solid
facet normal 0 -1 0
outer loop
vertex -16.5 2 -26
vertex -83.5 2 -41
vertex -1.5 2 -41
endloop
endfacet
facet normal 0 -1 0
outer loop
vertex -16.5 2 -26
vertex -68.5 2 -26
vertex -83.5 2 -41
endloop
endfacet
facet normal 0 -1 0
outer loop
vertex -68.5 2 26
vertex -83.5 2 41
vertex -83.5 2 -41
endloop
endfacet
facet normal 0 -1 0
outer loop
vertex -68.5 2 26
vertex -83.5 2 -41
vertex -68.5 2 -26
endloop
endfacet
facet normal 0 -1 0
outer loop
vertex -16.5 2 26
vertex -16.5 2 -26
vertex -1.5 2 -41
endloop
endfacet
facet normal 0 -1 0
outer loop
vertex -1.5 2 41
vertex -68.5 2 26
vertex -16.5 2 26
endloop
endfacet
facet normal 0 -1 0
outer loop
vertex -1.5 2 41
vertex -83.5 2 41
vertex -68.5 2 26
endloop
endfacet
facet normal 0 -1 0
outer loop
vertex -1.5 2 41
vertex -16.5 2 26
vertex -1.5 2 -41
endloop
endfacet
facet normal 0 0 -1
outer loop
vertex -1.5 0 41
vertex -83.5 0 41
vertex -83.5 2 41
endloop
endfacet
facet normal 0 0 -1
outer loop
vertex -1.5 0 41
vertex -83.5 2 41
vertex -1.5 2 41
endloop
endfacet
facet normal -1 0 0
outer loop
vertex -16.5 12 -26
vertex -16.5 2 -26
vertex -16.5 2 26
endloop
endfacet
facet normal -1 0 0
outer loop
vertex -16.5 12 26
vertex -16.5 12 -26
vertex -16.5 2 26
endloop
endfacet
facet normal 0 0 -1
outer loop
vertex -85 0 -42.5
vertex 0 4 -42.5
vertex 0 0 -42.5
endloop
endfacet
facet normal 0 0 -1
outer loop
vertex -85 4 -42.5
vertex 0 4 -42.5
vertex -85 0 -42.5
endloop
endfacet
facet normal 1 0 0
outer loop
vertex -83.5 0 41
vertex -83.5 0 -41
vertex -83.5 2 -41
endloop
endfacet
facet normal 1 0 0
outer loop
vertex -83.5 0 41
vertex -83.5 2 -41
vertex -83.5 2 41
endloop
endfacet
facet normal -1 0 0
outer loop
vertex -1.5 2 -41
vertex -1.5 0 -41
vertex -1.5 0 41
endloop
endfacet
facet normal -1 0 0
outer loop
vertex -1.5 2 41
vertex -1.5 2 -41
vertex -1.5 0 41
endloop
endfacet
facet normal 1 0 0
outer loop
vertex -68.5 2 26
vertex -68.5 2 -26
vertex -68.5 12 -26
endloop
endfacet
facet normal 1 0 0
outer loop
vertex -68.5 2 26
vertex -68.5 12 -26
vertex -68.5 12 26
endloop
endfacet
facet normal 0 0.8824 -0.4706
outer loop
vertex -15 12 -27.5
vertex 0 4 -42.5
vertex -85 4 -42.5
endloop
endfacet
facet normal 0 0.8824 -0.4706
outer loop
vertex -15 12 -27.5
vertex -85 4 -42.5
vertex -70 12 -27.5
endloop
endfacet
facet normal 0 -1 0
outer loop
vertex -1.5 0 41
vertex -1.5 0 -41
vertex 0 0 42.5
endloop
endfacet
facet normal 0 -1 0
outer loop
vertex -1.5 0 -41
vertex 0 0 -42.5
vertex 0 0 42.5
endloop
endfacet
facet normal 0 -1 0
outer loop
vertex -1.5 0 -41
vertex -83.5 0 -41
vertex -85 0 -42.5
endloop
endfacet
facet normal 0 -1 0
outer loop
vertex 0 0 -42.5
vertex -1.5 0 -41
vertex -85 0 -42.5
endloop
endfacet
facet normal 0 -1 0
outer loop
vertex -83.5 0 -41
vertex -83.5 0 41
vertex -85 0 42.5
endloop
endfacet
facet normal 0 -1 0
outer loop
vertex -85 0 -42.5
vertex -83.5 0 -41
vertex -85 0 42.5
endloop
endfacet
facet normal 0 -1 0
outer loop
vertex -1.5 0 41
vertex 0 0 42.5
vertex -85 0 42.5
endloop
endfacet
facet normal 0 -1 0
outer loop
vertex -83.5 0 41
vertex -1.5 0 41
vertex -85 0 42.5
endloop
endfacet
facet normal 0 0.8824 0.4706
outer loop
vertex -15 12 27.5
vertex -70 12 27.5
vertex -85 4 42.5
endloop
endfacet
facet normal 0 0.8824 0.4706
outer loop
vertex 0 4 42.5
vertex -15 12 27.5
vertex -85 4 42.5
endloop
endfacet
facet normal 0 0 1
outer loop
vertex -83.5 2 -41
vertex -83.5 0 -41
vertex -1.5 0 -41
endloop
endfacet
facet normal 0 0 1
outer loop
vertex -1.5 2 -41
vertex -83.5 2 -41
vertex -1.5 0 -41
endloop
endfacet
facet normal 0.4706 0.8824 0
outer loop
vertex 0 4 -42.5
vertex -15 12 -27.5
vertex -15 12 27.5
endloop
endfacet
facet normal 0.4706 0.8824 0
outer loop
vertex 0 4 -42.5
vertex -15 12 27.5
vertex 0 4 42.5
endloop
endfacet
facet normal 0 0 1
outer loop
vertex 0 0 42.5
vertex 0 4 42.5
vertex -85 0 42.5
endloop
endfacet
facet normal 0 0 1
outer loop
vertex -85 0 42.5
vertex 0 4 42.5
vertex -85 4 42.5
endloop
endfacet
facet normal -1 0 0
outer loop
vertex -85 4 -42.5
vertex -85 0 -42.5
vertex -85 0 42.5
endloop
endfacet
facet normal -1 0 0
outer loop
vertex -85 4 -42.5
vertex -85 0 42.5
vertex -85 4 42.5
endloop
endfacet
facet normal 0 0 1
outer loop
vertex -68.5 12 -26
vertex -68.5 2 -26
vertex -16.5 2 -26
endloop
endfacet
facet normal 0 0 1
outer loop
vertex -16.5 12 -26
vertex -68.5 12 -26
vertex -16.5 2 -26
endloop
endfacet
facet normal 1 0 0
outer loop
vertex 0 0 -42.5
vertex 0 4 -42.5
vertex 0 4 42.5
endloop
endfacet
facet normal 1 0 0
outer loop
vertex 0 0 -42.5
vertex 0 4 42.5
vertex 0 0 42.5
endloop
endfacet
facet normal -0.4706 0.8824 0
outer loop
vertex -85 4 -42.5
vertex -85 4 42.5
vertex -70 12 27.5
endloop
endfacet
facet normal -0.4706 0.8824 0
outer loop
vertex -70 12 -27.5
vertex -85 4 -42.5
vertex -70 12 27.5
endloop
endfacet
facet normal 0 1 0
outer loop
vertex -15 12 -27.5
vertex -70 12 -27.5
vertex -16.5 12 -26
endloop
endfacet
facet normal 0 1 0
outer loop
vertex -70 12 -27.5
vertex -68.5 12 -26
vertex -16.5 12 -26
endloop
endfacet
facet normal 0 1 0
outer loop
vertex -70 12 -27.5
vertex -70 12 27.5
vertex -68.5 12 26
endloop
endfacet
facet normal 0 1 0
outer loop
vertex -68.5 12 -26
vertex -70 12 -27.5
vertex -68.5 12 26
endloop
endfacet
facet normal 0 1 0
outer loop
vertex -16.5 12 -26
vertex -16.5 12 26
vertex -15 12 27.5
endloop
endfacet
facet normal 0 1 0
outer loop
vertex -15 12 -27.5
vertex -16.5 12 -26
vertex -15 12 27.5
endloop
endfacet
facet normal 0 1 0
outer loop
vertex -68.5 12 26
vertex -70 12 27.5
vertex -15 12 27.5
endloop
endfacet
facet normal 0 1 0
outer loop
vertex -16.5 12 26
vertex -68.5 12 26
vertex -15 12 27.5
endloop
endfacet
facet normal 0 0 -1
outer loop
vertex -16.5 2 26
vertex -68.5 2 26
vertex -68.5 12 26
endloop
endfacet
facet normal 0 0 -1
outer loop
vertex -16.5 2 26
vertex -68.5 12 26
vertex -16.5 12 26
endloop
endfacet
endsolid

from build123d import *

# Parameters (mm, degrees)
EXTRUDE_1_DEPTH     = 42.5
SKETCH_2_OUTSIDE_W  = 111.162
SKETCH_2_OUTSIDE_H  = 38.162
CUT_EXTRUDE_1_DEPTH = 86
SKETCH_3_W          = 52
SKETCH_3_H          = 52
CUT_EXTRUDE_2_DEPTH = 13
SKETCH_4_W          = 82
SKETCH_4_H          = 82
CUT_EXTRUDE_3_DEPTH = 2


with BuildPart() as part:
    # Эскиз1 → Бобышка-Вытянуть1 (new body, symmetric)
    with BuildSketch(Plane.XY):
        Polygon((0, 0), (-85, 0), (-85, 4), (-70, 12), (-15, 12), (0, 4), align=None)
    extrude(amount=EXTRUDE_1_DEPTH, both=True)

    # Эскиз2 outside → Вырез-Вытянуть1 (cut, through all)
    with BuildSketch(Plane(origin=(0, 0, 0), x_dir=(0, 0, -1), z_dir=(1, 0, 0))):
        with Locations((0, 6)):
            Rectangle(SKETCH_2_OUTSIDE_W, SKETCH_2_OUTSIDE_H)
        Polygon((-42.5, 4), (-42.5, 0), (42.5, 0), (42.5, 4), (27.5, 12), (-27.5, 12), align=None, mode=Mode.SUBTRACT)
    extrude(amount=-CUT_EXTRUDE_1_DEPTH, mode=Mode.SUBTRACT)

    # Эскиз3 → Вырез-Вытянуть2 (cut, through all)
    with BuildSketch(Plane.XZ):
        with Locations((-42.5, 0)):
            Rectangle(SKETCH_3_W, SKETCH_3_H)
    extrude(amount=-CUT_EXTRUDE_2_DEPTH, mode=Mode.SUBTRACT)

    # Эскиз4 → Вырез-Вытянуть3 (cut)
    with BuildSketch(Plane.XZ):
        with Locations((-42.5, 0)):
            Rectangle(SKETCH_4_W, SKETCH_4_H)
    extrude(amount=-CUT_EXTRUDE_3_DEPTH, mode=Mode.SUBTRACT)


solid = part.part
